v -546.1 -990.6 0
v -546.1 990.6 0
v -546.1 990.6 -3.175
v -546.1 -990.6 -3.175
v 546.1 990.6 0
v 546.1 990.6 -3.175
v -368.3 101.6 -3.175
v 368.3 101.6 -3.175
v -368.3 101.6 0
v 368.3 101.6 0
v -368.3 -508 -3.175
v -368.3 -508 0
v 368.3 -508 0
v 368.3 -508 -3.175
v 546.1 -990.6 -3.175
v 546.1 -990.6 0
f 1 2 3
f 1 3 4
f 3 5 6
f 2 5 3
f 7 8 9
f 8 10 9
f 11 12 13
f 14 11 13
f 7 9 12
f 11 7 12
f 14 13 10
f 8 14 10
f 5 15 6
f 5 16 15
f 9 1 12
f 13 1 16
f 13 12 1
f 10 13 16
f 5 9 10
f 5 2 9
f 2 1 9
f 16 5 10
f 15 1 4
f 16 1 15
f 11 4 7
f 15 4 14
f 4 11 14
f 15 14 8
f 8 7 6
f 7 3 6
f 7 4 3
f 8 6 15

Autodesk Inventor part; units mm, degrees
ref_plane "YZ Plane" through (0, 0, 0) normal (1, 0, 0) x (0, 1, 0)
ref_plane "XZ Plane" through (0, 0, 0) normal (0, 1, 0) x (-1, 0, 0)
ref_plane "XY Plane" through (0, 0, 0) normal (0, 0, 1) x (1, 0, 0)
sketch "Sketch1" plane through (0, 0, 0) normal (0, 0, 1) x (1, 0, 0)
  line L0 (-546.1, -990.6) -> (546.1, -990.6)
  line L1 (546.1, -990.6) -> (546.1, 990.6)
  line L2 (546.1, 990.6) -> (-546.1, 990.6)
  line L3 (-546.1, 990.6) -> (-546.1, -990.6)
  line L4 (-546.1, -990.6) -> (546.1, 990.6) construction
  line L5 (546.1, -990.6) -> (-546.1, 990.6) construction
  point P0 (0, 0)
  dimension "d0" = 1092.2
  dimension "d1" = 1981.2
extrude "Extrusion1" add sketch "Sketch1" against normal blind 3.175
sketch "Sketch2" plane through (0, 0, 0) normal (0, 0, 1) x (1, 0, 0)
  line L0 (546.1, 990.6) -> (-546.1, 990.6) projected
  line L1 (-546.1, 990.6) -> (-546.1, -990.6) projected
  line L2 (-368.3, -508) -> (368.3, -508)
  line L3 (368.3, -508) -> (368.3, 101.6)
  line L4 (368.3, 101.6) -> (-368.3, 101.6)
  line L5 (-368.3, 101.6) -> (-368.3, -508)
  point P0 (0, 0)
  dimension "d4" = 736.6
  dimension "d6" = 609.6
  dimension "d7" = 889
  dimension "d8" = 177.8
extrude "Extrusion2" cut sketch "Sketch2" against normal up to next
properties part number "GE-13012B" material "Polyethylene, High Density"
